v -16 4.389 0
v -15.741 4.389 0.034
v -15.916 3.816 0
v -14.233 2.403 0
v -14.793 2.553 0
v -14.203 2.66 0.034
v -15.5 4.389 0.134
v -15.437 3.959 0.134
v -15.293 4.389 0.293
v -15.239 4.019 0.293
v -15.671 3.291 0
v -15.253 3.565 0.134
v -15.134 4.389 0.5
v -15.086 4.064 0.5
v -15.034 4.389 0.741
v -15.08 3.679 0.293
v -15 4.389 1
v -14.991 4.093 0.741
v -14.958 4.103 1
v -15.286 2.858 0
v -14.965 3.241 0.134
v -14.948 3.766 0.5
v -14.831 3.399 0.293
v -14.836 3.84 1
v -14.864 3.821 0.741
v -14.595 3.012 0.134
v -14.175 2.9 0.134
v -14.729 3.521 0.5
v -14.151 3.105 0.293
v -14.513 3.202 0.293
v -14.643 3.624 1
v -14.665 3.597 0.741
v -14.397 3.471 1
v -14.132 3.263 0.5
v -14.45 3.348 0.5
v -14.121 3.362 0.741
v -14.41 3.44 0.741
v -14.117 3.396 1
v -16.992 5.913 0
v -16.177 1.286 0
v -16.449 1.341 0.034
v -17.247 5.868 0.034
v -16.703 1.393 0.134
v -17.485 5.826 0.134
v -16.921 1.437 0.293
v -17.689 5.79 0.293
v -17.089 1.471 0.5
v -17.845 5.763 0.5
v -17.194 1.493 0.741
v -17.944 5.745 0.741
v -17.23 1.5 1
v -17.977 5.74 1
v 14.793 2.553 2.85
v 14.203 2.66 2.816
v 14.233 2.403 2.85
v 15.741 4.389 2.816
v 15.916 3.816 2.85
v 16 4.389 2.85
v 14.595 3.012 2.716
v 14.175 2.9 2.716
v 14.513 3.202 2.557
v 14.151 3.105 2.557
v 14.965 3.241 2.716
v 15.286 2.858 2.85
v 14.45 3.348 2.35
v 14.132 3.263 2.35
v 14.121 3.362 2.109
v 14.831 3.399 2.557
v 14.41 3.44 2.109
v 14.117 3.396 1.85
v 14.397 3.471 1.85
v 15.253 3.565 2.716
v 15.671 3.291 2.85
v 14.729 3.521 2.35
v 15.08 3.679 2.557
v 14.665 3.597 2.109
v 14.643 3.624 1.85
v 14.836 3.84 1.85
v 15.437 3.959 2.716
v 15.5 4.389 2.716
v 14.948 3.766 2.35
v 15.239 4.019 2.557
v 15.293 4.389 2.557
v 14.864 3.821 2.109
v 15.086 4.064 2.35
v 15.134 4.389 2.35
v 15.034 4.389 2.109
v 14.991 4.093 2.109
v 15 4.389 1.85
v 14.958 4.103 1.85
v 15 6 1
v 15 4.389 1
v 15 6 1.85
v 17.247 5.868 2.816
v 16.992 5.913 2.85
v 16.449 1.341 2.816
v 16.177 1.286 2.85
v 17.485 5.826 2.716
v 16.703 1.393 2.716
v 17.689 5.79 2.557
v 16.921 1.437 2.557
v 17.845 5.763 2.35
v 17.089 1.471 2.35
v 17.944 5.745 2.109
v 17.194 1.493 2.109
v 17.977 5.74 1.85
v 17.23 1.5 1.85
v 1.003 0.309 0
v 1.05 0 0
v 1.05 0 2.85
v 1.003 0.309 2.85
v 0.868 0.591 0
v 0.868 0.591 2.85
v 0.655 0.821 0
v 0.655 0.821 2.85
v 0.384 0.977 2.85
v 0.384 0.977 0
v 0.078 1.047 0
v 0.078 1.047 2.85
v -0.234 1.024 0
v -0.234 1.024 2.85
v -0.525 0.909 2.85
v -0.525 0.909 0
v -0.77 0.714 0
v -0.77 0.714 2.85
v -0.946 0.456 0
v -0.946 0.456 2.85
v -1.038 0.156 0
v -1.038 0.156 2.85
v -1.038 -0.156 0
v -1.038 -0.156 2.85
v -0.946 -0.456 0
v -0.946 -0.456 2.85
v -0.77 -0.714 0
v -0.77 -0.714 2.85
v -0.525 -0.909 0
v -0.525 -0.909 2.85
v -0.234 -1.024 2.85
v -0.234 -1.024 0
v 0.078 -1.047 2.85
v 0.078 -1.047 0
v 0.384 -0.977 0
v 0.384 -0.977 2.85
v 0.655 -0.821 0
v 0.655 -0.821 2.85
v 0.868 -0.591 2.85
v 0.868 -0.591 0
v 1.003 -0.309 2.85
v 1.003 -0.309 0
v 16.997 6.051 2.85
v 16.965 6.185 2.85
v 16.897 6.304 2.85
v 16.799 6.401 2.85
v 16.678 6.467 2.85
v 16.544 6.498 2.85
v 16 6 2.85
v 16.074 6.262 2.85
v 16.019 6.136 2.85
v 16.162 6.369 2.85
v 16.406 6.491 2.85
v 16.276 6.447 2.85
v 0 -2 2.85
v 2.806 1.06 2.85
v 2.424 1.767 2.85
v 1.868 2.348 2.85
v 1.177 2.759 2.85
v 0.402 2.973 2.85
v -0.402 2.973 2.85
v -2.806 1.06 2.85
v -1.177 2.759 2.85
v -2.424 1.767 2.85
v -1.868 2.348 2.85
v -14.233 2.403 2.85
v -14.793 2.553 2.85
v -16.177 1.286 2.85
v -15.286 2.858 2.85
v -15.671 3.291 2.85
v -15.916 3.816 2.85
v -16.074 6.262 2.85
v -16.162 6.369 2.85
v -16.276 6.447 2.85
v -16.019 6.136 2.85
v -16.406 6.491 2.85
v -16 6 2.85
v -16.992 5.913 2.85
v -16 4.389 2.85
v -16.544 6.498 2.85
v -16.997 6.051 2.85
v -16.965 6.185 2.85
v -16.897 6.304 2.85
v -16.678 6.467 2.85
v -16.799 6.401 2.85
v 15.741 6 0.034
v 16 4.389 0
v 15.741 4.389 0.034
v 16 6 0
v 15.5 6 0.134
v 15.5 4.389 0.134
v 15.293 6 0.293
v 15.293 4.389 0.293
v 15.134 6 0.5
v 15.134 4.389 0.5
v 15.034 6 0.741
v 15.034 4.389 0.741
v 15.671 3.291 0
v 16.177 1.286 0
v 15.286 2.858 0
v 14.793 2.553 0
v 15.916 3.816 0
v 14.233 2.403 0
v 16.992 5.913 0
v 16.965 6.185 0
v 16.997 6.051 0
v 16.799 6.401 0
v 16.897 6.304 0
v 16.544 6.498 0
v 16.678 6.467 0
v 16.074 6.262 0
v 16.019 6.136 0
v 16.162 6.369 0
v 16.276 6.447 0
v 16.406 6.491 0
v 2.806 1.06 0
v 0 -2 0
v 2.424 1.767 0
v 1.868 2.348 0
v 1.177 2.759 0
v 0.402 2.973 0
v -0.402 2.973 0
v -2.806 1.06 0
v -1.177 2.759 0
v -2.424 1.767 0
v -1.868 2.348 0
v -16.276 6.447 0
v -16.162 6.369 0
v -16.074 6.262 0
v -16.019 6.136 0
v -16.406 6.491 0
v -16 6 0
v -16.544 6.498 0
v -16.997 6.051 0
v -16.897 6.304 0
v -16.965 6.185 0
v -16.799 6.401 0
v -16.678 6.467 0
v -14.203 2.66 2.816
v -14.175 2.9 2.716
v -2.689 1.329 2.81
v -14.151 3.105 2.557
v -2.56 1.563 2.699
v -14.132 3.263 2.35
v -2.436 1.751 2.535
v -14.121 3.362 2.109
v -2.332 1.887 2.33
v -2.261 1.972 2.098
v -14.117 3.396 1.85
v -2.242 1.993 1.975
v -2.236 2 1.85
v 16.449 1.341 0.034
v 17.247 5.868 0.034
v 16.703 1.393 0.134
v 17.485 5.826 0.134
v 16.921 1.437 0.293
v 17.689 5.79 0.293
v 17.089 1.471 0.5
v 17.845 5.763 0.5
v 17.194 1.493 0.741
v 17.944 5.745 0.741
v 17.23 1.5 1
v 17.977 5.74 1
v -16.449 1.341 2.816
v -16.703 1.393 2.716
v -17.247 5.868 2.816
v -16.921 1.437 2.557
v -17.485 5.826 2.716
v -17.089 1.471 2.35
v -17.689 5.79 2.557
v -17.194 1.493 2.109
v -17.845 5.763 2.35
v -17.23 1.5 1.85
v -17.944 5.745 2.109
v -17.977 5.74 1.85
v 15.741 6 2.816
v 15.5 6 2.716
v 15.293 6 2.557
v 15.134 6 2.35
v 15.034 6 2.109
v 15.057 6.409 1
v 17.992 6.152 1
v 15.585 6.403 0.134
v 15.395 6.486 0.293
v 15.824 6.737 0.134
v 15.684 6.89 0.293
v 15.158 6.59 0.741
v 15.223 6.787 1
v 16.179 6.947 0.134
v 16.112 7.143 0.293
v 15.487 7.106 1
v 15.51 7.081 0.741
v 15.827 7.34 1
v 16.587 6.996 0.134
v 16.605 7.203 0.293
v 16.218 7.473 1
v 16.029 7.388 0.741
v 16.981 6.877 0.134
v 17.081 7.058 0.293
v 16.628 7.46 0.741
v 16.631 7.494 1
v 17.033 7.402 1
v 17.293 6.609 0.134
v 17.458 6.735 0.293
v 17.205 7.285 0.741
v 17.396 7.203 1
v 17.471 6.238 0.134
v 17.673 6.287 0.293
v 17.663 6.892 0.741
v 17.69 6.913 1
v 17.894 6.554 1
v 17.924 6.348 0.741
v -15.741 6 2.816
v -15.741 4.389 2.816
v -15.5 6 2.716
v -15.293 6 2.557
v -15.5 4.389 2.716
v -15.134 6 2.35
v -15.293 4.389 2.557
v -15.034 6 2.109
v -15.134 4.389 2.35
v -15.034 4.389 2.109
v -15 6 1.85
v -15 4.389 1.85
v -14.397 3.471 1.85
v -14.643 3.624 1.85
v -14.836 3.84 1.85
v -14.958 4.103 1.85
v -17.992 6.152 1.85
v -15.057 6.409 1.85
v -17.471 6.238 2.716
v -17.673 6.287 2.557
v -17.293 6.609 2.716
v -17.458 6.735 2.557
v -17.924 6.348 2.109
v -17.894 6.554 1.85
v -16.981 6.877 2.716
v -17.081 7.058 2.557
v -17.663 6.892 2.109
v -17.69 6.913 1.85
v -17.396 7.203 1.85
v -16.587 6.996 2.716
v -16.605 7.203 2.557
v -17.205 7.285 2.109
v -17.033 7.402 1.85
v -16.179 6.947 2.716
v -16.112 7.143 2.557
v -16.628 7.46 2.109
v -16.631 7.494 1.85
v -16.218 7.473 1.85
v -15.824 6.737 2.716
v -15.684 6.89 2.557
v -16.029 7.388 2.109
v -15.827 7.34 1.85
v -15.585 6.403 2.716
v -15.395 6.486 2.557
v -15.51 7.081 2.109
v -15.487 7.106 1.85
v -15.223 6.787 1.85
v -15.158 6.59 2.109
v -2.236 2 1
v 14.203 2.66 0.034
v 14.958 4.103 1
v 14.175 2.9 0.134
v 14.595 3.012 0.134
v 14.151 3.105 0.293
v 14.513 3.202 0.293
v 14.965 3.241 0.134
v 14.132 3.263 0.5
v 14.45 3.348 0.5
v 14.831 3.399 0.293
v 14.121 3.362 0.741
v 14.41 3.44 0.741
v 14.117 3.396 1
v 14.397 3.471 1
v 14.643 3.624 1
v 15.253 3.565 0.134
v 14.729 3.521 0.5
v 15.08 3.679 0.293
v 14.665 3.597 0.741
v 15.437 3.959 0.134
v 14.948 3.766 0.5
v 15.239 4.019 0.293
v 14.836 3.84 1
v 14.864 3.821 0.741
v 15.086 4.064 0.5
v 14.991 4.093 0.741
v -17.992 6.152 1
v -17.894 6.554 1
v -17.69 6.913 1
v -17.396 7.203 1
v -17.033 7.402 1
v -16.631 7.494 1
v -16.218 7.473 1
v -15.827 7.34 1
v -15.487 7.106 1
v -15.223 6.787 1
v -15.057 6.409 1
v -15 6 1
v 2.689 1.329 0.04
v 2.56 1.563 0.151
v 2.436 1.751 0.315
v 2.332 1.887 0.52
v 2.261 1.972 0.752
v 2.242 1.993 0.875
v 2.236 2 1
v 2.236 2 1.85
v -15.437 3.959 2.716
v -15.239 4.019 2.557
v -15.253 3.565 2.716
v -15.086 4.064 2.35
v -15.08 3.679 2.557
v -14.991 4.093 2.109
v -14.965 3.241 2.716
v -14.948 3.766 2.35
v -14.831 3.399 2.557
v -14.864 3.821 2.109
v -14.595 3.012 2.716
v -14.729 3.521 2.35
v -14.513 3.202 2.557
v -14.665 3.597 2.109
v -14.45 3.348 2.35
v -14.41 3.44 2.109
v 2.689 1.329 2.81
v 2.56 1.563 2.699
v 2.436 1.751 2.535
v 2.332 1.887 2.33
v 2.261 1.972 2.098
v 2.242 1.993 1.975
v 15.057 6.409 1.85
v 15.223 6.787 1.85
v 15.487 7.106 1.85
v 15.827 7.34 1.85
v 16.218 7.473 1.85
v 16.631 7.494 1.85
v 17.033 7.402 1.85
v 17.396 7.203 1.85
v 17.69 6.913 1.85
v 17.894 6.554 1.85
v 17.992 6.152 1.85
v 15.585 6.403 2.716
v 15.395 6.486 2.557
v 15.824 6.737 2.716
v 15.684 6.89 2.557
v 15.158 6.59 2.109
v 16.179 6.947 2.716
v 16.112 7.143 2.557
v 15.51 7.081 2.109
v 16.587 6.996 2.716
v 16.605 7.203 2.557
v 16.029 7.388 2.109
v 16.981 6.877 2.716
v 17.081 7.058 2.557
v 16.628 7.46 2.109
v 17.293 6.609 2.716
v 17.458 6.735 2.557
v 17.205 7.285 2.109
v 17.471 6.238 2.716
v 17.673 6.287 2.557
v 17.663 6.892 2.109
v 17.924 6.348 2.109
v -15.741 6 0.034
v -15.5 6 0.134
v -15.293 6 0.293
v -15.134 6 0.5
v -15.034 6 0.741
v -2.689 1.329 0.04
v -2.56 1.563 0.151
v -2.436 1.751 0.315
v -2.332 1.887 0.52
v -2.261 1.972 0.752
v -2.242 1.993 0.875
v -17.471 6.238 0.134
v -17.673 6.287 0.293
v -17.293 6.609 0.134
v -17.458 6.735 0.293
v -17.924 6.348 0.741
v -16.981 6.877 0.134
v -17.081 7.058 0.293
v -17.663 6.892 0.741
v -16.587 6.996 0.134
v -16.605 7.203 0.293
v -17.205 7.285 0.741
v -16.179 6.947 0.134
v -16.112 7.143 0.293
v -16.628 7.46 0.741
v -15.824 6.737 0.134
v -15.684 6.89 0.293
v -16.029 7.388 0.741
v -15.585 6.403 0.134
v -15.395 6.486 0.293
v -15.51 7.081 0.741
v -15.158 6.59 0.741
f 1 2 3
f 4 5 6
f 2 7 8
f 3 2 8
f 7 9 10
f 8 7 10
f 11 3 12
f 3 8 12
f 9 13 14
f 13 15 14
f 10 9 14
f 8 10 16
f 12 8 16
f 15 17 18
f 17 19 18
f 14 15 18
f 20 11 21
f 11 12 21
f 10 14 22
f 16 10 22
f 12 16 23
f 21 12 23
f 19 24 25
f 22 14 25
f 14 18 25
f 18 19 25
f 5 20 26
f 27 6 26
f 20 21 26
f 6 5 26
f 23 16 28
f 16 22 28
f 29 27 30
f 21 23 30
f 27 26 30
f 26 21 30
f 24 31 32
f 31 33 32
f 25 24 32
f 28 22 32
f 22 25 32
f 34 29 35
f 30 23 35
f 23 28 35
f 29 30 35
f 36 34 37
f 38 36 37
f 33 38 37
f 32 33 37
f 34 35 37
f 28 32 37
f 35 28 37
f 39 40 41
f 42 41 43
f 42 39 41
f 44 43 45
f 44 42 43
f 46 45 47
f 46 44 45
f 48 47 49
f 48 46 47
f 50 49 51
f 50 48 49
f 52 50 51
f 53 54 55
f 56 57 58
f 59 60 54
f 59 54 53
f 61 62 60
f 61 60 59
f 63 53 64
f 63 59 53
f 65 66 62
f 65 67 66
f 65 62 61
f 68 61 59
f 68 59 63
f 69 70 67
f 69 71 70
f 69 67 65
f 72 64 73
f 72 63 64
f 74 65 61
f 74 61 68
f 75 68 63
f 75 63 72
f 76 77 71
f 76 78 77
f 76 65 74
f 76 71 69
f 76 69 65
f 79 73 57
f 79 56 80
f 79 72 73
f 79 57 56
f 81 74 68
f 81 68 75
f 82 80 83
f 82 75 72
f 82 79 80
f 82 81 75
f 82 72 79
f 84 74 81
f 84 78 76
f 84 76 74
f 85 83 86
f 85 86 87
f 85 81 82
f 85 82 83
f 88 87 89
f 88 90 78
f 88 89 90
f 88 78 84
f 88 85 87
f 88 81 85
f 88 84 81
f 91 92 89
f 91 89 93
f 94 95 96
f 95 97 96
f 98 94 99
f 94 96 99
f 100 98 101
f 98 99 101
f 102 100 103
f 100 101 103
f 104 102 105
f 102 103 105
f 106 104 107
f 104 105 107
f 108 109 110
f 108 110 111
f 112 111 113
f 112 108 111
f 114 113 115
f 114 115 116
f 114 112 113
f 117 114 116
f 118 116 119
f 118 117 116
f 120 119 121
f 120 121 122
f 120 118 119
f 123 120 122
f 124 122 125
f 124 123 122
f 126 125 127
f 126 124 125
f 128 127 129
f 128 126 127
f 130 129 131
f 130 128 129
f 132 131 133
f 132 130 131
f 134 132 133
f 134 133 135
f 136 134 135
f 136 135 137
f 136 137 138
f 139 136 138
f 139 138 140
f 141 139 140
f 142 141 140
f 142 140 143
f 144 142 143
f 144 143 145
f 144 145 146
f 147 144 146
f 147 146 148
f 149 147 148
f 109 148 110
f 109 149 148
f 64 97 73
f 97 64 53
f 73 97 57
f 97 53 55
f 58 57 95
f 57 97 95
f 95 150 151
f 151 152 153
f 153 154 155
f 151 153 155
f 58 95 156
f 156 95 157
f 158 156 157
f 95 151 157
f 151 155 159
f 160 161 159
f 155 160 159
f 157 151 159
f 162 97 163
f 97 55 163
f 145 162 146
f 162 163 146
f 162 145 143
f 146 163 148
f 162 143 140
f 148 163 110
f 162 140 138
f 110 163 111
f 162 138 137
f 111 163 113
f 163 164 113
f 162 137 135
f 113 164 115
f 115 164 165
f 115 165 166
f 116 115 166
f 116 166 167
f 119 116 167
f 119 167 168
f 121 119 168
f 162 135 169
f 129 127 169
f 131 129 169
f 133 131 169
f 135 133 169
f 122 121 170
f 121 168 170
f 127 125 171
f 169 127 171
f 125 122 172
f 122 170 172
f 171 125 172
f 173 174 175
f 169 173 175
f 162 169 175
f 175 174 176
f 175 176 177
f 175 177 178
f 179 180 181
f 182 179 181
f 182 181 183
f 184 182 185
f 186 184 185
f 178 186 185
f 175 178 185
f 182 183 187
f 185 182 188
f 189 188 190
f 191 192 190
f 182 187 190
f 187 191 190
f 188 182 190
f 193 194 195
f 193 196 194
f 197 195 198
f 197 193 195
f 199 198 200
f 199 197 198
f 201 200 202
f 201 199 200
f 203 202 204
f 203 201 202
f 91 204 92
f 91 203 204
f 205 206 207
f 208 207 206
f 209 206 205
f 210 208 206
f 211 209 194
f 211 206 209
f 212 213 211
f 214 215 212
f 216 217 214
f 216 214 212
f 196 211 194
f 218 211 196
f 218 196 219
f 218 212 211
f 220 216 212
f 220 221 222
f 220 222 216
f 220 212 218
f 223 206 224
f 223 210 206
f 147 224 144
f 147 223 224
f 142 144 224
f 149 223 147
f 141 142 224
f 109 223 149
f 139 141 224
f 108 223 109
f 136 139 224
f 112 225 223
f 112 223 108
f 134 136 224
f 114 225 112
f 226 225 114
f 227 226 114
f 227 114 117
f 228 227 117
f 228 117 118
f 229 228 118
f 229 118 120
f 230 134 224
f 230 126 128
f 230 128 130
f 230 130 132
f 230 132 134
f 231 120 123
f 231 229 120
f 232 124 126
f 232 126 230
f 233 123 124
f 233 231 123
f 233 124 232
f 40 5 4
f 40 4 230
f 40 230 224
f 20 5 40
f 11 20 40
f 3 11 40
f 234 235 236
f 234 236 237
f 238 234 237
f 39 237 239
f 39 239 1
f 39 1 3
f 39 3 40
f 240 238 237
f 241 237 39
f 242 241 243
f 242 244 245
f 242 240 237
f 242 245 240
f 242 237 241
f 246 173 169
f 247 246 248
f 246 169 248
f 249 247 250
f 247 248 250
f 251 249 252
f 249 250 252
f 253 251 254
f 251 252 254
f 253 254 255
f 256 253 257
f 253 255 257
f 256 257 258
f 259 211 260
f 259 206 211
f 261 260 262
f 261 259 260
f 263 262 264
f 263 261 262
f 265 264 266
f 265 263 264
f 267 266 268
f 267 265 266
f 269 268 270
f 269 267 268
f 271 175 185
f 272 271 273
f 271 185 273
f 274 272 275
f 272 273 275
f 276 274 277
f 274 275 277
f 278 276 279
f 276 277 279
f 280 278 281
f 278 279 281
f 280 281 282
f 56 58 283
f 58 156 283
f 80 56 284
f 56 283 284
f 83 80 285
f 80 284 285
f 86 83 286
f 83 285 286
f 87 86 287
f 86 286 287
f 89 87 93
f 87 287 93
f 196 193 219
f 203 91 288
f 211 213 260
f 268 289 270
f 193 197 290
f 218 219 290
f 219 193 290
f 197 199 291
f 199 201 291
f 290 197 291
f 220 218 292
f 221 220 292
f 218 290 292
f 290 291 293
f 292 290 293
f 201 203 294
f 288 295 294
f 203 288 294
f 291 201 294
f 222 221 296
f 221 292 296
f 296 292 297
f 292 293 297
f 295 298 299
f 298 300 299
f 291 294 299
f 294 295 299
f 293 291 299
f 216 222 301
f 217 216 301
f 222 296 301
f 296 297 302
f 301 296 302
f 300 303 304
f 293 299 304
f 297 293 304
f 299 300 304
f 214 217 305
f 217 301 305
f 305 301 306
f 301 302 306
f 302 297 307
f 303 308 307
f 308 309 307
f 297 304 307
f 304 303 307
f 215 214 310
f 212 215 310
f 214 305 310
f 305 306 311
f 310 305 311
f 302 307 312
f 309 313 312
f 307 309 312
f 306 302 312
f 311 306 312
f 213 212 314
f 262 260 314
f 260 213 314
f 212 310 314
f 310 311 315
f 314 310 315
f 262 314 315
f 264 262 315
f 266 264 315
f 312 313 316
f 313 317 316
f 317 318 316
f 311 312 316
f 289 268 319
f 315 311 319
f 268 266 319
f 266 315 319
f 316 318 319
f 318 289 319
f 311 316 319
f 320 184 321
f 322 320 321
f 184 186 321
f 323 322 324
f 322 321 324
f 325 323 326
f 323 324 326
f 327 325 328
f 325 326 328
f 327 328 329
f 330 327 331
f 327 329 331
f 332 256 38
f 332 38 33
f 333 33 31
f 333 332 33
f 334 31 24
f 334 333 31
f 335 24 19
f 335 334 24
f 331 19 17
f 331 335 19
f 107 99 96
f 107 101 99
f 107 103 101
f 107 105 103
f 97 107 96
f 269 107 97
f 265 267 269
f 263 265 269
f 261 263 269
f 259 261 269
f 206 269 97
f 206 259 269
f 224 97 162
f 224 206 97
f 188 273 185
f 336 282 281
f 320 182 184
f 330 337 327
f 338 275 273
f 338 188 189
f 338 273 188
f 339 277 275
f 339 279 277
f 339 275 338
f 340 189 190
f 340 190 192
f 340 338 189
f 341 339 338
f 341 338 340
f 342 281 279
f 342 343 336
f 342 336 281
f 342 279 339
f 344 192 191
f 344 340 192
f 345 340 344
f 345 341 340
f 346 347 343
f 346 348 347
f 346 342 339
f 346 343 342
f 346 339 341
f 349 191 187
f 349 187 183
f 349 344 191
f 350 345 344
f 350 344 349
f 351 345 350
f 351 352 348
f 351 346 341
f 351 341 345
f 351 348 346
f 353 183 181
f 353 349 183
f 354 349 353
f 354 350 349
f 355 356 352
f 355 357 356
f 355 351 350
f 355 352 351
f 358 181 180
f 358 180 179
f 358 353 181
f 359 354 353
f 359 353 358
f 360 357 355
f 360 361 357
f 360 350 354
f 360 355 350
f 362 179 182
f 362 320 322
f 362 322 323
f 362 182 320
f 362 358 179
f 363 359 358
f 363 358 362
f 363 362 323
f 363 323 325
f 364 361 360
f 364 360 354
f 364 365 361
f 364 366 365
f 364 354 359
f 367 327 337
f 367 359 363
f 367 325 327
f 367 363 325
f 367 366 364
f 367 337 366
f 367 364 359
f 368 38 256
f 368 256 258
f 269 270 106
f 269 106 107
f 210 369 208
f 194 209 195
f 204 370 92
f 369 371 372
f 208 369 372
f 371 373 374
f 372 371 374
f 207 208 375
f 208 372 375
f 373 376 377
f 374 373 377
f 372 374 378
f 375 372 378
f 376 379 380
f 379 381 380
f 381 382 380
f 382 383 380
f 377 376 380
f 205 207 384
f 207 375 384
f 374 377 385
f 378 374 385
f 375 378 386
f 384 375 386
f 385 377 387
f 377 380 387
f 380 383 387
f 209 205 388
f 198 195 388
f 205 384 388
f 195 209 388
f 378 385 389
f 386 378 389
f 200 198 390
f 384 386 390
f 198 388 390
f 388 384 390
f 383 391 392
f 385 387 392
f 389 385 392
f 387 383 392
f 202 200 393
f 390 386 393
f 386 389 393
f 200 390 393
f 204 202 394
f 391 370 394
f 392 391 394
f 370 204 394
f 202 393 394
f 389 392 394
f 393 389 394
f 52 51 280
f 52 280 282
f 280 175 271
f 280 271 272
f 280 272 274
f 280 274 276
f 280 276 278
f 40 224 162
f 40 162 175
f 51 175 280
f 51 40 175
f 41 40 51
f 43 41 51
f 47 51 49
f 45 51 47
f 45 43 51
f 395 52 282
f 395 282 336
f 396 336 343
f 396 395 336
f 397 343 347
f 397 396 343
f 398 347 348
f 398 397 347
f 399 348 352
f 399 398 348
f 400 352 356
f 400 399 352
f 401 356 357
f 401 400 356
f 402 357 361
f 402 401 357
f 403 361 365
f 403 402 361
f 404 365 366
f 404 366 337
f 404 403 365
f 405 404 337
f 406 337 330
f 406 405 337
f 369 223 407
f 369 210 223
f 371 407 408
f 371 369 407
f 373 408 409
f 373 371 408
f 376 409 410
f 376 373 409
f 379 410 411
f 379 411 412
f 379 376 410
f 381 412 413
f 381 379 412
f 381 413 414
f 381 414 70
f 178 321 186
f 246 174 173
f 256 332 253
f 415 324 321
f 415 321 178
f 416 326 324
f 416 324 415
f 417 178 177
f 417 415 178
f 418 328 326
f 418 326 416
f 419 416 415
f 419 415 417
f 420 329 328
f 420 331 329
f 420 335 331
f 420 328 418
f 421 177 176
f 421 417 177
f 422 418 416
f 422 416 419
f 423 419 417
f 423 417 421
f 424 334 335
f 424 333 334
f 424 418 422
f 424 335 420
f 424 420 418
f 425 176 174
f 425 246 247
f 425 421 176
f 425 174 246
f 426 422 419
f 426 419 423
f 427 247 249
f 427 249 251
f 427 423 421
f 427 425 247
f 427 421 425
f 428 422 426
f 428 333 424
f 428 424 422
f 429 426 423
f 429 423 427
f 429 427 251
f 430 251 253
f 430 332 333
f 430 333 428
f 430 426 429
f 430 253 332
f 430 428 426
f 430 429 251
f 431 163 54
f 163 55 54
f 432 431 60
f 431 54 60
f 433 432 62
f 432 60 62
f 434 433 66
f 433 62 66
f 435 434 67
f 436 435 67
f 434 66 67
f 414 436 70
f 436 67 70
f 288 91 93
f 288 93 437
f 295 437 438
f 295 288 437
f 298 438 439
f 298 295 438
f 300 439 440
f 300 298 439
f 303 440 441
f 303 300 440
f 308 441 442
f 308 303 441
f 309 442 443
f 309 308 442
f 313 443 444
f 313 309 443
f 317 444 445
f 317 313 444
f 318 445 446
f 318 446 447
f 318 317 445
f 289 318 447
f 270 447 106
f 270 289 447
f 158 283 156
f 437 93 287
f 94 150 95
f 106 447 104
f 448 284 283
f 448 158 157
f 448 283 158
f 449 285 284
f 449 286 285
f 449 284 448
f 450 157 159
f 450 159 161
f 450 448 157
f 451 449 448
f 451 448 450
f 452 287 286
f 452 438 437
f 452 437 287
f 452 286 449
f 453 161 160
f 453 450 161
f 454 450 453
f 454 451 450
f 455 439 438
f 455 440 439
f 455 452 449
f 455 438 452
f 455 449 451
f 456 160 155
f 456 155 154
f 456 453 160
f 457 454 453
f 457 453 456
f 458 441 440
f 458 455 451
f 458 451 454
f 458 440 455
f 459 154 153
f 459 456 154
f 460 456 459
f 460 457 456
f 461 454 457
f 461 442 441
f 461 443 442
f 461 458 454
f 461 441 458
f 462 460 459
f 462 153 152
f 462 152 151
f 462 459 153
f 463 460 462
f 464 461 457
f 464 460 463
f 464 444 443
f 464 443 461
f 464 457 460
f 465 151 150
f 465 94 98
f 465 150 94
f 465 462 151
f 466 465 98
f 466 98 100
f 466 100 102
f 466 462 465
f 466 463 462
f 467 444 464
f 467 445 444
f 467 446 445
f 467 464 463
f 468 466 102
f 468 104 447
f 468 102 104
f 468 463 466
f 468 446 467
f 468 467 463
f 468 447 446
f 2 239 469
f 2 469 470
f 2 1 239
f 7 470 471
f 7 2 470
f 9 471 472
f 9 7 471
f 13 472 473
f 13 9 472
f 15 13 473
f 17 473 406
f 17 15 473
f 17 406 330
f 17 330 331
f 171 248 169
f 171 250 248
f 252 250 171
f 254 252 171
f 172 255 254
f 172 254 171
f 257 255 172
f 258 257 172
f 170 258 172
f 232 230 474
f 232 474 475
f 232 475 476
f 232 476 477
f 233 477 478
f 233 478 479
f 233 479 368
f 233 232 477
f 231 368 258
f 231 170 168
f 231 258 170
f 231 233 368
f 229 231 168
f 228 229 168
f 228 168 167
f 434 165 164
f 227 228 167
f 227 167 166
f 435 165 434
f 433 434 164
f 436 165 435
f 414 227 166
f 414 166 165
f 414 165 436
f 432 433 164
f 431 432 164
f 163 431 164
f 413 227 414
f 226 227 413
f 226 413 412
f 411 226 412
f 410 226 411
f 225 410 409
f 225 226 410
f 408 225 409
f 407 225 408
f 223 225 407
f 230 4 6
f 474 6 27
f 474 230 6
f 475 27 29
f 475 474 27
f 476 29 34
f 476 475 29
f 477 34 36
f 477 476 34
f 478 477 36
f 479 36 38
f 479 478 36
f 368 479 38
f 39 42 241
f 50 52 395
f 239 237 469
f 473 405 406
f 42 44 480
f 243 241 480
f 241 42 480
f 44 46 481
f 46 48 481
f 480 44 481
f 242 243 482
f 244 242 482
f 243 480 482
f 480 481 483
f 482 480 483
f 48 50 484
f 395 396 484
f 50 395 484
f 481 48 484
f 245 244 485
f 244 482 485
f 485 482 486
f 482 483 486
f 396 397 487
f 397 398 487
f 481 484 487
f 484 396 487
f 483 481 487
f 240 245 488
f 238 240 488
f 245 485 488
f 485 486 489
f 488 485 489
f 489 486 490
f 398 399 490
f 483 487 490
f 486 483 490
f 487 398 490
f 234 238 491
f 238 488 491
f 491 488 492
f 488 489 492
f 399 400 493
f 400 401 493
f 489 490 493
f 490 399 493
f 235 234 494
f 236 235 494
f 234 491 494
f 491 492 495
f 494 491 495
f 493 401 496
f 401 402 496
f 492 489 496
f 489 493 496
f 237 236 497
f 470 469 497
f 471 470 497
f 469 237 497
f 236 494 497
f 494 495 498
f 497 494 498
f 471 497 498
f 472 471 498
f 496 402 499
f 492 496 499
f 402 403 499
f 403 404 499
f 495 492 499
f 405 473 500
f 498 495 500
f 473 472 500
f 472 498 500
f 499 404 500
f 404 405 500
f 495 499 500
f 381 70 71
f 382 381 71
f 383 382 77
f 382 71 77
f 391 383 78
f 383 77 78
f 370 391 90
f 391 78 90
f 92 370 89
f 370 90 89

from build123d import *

# Parameters (mm, degrees)
SKETCH1_R           = 1.05
BOSS_EXTRUDE1_DEPTH = 2.85
FILLET2_R           = 1
FILLET1_R           = 1


with BuildPart() as part:
    # Sketch1 → Boss-Extrude1 (new body)
    with BuildSketch(Plane.XY):
        with BuildLine():
            Line((2.236067977, 2), (15, 3.5))
            Line((15, 3.5), (15, 6))
            ThreePointArc((15, 6), (16.630733614, 7.494292047), (17.97721163, 5.739527733))
            Line((17.97721163, 5.739527733), (17.229668505, 1.5))
            Line((17.229668505, 1.5), (0, -2))
            Line((0, -2), (-17.229668505, 1.5))
            Line((-17.229668505, 1.5), (-17.97721163, 5.739527733))
            ThreePointArc((-17.97721163, 5.739527733), (-16.630733614, 7.494292047), (-15, 6))
            Line((-15, 6), (-15, 3.5))
            Line((-15, 3.5), (-2.236067977, 2))
            ThreePointArc((-2.236067977, 2), (0, 3), (2.236067977, 2))
        make_face()
        Circle(SKETCH1_R, mode=Mode.SUBTRACT)
    extrude(amount=BOSS_EXTRUDE1_DEPTH)

    # Fillet2
    fillet2_edges = [part.edges().sort_by_distance(p)[0] for p in [
        (15, 3.5, 1.425),
        (-15, 3.5, 1.425),
    ]]
    fillet(fillet2_edges, radius=FILLET2_R)

    # Fillet1
    fillet1_edges = [part.edges().sort_by_distance(p)[0] for p in [
        (15, 5.194681496, 0),
        (16.630733614, 7.494292047, 0),
        (17.603440067, 3.619763867, 0),
        (-17.603440067, 3.619763867, 0),
        (-16.630733614, 7.494292047, 0),
        (-16.630733614, 7.494292047, 2.85),
        (-8.176391715, 2.698098798, 0),
        (-17.603440067, 3.619763867, 2.85),
        (17.603440067, 3.619763867, 2.85),
        (16.630733614, 7.494292047, 2.85),
        (15, 5.194681496, 2.85),
        (-15, 5.194681496, 0),
        (-15, 5.194681496, 2.85),
        (8.176391715, 2.698098798, 0),
        (8.176391715, 2.698098798, 2.85),
        (-14.747233381, 3.724801276, 0),
        (-14.747233381, 3.724801276, 2.85),
        (14.747233381, 3.724801276, 0),
        (14.747233381, 3.724801276, 2.85),
        (-8.176391715, 2.698098798, 2.85),
    ]]
    fillet(fillet1_edges, radius=FILLET1_R)


solid = part.part
